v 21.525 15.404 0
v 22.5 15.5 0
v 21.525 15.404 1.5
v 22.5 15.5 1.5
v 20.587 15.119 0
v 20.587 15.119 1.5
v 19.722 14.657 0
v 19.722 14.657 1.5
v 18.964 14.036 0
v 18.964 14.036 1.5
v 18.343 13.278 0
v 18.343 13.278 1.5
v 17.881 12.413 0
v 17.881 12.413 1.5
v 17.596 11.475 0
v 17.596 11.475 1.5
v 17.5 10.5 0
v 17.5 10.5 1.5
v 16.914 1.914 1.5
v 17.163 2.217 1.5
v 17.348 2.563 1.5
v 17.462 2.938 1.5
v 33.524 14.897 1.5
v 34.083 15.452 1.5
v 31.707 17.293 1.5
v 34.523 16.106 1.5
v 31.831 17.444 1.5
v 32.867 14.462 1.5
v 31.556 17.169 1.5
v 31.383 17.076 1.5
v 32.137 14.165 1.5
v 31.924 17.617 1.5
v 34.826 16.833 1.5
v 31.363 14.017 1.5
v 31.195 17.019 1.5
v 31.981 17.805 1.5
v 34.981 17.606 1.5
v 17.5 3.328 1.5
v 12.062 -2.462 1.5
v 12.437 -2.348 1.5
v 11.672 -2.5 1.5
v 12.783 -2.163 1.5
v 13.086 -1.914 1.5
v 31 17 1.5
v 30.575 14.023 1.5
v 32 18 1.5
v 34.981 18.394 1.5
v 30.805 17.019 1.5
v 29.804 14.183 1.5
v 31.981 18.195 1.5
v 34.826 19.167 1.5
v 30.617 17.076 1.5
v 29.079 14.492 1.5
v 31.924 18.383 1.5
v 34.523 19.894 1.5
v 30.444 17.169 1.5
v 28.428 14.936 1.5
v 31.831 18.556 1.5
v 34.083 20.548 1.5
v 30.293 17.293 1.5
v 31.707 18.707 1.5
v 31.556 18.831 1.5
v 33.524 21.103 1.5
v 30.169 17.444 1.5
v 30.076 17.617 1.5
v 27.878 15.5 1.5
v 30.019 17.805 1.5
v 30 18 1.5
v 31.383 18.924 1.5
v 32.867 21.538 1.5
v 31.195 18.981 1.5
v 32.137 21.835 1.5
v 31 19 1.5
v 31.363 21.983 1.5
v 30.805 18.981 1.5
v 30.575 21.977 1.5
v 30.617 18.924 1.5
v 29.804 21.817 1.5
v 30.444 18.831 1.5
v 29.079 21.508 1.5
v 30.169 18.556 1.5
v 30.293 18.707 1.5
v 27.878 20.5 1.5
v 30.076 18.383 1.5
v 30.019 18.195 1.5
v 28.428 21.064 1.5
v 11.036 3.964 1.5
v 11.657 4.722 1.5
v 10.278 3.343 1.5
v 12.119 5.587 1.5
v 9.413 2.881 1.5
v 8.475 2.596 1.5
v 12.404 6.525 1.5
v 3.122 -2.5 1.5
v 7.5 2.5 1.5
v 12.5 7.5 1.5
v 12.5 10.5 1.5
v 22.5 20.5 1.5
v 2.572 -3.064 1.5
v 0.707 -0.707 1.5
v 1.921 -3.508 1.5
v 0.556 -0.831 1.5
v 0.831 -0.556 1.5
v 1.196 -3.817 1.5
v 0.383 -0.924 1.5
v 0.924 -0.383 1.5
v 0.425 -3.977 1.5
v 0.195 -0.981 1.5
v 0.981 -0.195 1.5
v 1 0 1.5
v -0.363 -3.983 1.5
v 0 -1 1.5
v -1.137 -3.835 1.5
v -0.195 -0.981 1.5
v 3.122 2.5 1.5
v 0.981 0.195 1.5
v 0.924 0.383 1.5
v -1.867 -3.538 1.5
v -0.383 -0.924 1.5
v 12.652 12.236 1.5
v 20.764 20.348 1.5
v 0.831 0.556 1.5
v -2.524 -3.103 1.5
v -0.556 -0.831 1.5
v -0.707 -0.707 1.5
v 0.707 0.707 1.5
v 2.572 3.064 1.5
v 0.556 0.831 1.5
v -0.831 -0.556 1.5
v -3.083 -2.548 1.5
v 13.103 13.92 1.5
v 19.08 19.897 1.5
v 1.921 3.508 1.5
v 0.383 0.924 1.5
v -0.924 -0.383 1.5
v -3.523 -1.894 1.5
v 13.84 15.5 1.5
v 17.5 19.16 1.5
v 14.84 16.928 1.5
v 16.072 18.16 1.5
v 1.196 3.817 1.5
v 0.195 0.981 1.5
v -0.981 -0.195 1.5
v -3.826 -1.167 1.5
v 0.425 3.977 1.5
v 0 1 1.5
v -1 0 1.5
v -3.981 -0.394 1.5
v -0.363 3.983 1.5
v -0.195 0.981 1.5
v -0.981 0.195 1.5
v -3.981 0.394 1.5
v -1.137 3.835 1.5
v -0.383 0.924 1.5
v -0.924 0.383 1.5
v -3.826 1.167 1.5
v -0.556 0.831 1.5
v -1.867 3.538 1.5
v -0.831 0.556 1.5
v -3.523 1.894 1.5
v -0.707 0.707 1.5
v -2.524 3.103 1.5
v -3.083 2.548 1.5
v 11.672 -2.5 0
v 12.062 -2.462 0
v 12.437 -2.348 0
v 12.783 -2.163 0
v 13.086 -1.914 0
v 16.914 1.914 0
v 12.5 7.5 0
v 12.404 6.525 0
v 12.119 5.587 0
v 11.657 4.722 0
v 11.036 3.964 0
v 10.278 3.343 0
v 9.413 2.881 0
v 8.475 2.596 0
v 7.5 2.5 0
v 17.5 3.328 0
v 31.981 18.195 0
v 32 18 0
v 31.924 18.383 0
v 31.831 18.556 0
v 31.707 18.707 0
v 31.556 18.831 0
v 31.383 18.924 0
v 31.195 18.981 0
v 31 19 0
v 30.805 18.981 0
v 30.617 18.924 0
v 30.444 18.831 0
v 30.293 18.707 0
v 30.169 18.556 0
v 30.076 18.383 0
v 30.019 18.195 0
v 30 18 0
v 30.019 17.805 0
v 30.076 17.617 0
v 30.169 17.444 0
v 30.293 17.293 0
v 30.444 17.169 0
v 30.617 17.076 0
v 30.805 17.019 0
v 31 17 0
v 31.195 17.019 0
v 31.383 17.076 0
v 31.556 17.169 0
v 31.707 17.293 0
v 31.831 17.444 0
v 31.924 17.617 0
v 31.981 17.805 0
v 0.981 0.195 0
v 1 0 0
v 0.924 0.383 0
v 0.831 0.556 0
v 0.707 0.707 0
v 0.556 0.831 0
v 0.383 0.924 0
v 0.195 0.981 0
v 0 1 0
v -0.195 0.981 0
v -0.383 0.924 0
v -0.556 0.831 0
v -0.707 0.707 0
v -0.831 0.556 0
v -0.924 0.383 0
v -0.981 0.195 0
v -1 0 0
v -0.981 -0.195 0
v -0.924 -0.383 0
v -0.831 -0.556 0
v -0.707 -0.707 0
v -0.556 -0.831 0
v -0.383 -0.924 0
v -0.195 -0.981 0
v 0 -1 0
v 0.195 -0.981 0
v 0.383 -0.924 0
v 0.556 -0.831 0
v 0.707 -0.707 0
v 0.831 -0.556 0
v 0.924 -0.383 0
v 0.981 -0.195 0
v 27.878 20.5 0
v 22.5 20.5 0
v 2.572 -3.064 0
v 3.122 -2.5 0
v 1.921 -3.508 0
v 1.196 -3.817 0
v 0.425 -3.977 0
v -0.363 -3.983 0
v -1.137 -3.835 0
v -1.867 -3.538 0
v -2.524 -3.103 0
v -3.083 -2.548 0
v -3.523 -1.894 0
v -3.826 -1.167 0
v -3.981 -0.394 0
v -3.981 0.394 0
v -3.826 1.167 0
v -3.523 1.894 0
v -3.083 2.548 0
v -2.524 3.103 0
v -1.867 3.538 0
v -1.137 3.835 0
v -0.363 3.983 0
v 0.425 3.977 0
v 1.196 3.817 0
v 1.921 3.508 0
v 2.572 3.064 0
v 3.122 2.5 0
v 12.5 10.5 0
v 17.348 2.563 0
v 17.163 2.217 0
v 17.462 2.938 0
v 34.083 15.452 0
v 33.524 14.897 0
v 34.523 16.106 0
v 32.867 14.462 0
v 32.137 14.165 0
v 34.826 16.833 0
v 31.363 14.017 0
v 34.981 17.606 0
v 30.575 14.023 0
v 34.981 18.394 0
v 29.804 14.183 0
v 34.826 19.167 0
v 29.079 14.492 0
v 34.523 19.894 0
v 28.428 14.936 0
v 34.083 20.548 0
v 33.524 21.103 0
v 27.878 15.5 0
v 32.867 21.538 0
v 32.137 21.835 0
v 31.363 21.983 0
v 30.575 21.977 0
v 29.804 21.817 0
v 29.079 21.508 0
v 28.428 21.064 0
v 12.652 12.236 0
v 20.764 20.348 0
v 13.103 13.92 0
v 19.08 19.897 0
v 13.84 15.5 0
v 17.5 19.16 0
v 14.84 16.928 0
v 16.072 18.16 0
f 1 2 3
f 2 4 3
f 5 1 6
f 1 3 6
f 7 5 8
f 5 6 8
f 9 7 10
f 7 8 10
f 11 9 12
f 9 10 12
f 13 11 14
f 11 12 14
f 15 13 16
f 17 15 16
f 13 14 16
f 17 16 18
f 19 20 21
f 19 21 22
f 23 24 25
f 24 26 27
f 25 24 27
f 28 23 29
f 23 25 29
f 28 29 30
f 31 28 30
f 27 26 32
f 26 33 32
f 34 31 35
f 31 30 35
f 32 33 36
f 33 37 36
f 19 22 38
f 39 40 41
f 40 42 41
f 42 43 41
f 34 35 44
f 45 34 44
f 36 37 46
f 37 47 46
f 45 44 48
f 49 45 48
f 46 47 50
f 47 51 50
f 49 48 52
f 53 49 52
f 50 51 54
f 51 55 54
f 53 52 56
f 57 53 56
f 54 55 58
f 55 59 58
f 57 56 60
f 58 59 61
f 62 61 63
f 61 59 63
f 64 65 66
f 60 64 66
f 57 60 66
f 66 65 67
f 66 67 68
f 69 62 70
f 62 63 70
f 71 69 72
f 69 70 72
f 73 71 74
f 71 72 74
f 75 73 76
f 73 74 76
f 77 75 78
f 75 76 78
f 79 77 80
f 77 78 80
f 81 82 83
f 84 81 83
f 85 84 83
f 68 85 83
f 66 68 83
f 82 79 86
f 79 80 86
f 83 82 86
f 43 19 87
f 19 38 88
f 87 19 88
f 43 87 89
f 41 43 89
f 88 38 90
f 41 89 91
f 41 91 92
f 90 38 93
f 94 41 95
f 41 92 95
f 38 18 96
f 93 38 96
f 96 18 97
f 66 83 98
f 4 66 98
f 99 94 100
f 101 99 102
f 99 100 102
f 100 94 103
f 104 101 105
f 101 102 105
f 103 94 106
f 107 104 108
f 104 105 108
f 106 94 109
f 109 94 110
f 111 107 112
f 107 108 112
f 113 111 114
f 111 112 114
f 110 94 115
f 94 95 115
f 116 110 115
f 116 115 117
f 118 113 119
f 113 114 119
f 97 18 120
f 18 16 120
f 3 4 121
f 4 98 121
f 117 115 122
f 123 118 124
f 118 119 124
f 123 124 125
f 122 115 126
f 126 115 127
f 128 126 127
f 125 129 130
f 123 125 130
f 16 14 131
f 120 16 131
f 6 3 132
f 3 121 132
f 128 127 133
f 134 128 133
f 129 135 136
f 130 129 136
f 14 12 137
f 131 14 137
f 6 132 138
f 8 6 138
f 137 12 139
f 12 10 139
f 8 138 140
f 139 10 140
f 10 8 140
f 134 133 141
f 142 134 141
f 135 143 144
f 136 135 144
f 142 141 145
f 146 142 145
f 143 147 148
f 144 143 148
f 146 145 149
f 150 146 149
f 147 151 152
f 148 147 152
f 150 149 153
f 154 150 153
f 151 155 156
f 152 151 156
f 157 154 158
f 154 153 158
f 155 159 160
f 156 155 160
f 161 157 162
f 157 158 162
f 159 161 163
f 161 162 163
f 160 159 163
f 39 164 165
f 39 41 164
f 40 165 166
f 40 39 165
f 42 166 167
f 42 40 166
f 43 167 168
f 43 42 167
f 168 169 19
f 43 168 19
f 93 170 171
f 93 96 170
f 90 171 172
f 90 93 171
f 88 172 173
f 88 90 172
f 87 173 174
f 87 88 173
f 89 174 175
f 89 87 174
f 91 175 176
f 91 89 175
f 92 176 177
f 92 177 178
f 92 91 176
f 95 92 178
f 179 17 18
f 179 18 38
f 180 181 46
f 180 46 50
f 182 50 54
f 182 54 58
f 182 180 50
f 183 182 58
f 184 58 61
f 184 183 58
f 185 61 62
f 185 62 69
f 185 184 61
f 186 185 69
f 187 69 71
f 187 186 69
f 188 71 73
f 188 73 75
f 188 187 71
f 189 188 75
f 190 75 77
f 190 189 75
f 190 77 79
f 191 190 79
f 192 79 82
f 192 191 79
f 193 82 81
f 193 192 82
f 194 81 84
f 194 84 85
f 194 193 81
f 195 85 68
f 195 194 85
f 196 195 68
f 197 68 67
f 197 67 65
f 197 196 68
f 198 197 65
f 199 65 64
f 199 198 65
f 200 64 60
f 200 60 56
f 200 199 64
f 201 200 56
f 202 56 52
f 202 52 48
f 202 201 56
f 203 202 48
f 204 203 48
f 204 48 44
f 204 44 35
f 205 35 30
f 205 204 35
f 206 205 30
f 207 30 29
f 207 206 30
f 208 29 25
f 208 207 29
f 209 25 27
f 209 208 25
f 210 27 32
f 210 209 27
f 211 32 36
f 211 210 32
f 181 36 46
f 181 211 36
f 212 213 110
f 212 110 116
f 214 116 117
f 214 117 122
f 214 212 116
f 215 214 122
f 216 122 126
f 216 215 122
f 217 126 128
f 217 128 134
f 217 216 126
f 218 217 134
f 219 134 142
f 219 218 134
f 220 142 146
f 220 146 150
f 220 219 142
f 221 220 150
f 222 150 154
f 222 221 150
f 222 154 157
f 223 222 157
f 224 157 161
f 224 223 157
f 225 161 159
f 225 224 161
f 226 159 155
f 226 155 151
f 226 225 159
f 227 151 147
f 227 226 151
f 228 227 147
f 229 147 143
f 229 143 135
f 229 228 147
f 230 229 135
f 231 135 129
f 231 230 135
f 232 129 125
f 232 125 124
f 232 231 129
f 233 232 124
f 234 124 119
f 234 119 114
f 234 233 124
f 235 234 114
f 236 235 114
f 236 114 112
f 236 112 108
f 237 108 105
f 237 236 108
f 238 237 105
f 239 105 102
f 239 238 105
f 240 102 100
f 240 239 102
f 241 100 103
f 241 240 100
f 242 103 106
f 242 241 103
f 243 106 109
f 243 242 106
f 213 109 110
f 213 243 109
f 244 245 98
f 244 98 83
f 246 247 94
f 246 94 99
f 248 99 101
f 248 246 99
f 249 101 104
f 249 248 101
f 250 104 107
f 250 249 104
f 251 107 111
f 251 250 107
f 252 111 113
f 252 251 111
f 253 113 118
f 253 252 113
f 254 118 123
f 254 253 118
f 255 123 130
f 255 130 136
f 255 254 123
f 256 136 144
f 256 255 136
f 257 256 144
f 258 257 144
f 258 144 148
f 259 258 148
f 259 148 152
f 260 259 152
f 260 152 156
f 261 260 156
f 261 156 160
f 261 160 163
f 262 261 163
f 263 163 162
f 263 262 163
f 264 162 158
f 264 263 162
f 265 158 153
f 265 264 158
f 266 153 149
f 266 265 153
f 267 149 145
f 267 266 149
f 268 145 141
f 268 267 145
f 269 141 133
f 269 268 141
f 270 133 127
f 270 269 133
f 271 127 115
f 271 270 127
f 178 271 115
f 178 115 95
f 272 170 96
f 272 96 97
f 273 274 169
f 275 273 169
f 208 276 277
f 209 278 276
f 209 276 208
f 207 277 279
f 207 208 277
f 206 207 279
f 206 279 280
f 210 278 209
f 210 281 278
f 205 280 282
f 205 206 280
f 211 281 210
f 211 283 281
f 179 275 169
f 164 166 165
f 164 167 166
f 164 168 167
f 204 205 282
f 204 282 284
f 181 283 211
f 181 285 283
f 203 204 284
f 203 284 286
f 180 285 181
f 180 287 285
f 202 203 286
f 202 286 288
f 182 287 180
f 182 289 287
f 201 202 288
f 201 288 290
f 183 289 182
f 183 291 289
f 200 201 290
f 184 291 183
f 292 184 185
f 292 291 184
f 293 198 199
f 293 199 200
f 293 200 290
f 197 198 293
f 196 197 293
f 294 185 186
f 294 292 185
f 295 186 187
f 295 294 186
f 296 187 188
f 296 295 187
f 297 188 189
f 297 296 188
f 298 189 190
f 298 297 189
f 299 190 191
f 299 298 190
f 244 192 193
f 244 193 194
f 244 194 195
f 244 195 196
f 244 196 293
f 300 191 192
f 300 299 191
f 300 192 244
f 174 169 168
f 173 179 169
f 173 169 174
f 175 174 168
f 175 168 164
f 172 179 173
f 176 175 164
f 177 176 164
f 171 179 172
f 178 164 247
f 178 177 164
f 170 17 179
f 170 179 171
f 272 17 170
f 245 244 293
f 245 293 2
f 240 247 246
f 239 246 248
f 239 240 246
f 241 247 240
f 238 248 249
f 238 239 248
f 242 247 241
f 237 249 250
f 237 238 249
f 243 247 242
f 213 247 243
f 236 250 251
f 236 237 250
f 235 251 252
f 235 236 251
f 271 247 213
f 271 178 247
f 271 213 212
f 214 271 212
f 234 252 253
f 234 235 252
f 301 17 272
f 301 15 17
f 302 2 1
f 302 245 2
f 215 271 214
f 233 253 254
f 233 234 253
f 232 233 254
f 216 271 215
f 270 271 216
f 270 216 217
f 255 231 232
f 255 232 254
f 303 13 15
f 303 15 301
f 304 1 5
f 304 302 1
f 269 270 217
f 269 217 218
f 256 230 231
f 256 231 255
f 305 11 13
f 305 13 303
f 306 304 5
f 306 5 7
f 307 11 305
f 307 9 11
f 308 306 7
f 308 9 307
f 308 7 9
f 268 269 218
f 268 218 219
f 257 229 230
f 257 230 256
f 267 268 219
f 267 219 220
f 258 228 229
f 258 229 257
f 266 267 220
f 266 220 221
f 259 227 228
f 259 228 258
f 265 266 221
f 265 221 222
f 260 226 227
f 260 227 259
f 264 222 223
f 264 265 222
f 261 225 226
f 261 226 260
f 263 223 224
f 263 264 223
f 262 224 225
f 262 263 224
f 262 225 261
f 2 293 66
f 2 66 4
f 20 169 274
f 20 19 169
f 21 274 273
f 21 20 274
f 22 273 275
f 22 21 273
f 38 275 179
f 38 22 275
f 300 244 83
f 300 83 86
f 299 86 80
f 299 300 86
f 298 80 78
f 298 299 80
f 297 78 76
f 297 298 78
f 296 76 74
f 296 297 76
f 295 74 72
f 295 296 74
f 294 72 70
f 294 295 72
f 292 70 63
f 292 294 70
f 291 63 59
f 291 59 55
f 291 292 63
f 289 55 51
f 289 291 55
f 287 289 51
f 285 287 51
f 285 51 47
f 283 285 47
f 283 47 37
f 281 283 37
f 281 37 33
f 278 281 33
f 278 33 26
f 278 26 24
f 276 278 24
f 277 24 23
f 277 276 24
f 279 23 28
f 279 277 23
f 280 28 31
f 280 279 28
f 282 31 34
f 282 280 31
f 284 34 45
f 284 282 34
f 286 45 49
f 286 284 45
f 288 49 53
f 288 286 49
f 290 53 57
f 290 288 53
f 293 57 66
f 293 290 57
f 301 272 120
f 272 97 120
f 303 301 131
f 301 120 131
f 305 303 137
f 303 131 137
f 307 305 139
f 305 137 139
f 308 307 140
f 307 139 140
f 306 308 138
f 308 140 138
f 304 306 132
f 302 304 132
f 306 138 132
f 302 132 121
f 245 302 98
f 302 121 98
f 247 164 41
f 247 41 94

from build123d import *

# Parameters (mm, degrees)
SKETCH1_R           = 1
BOSS_EXTRUDE1_DEPTH = 1.5
FILLET1_R           = 10
FILLET2_R           = 5
FILLET3_R           = 5
CHAMFER1_SIZE       = 5
FILLET4_R           = 2


with BuildPart() as part:
    # Sketch1 → Boss-Extrude1 (new body)
    with BuildSketch(Plane.XY):
        with BuildLine():
            Line((3.122498999, 2.5), (12.5, 2.5))
            Line((12.5, 2.5), (12.5, 20.5))
            Line((12.5, 20.5), (27.877501001, 20.5))
            ThreePointArc((27.877501001, 20.5), (35, 18), (27.877501001, 15.5))
            Line((27.877501001, 15.5), (17.5, 15.5))
            Line((17.5, 15.5), (17.5, -2.5))
            Line((17.5, -2.5), (3.122498999, -2.5))
            ThreePointArc((3.122498999, -2.5), (-4, 0), (3.122498999, 2.5))
        make_face()
        Circle(SKETCH1_R, mode=Mode.SUBTRACT)
        with Locations((31, 18)):
            Circle(SKETCH1_R, mode=Mode.SUBTRACT)
    extrude(amount=BOSS_EXTRUDE1_DEPTH)

    # Fillet1
    fillet1_edges = [part.edges().sort_by_distance(p)[0] for p in [
        (12.5, 20.5, 0.75),
    ]]
    fillet(fillet1_edges, radius=FILLET1_R)

    # Fillet2
    fillet2_edges = [part.edges().sort_by_distance(p)[0] for p in [
        (17.5, 15.5, 0.75),
    ]]
    fillet(fillet2_edges, radius=FILLET2_R)

    # Fillet3
    fillet3_edges = [part.edges().sort_by_distance(p)[0] for p in [
        (12.5, 2.5, 0.75),
    ]]
    fillet(fillet3_edges, radius=FILLET3_R)

    # Chamfer1
    chamfer1_edges = [part.edges().sort_by_distance(p)[0] for p in [
        (17.5, -2.5, 0.75),
    ]]
    chamfer(chamfer1_edges, length=CHAMFER1_SIZE)

    # Fillet4
    fillet4_edges = [part.edges().sort_by_distance(p)[0] for p in [
        (17.5, 2.5, 0.75),
        (12.5, -2.5, 0.75),
    ]]
    fillet(fillet4_edges, radius=FILLET4_R)


solid = part.part
